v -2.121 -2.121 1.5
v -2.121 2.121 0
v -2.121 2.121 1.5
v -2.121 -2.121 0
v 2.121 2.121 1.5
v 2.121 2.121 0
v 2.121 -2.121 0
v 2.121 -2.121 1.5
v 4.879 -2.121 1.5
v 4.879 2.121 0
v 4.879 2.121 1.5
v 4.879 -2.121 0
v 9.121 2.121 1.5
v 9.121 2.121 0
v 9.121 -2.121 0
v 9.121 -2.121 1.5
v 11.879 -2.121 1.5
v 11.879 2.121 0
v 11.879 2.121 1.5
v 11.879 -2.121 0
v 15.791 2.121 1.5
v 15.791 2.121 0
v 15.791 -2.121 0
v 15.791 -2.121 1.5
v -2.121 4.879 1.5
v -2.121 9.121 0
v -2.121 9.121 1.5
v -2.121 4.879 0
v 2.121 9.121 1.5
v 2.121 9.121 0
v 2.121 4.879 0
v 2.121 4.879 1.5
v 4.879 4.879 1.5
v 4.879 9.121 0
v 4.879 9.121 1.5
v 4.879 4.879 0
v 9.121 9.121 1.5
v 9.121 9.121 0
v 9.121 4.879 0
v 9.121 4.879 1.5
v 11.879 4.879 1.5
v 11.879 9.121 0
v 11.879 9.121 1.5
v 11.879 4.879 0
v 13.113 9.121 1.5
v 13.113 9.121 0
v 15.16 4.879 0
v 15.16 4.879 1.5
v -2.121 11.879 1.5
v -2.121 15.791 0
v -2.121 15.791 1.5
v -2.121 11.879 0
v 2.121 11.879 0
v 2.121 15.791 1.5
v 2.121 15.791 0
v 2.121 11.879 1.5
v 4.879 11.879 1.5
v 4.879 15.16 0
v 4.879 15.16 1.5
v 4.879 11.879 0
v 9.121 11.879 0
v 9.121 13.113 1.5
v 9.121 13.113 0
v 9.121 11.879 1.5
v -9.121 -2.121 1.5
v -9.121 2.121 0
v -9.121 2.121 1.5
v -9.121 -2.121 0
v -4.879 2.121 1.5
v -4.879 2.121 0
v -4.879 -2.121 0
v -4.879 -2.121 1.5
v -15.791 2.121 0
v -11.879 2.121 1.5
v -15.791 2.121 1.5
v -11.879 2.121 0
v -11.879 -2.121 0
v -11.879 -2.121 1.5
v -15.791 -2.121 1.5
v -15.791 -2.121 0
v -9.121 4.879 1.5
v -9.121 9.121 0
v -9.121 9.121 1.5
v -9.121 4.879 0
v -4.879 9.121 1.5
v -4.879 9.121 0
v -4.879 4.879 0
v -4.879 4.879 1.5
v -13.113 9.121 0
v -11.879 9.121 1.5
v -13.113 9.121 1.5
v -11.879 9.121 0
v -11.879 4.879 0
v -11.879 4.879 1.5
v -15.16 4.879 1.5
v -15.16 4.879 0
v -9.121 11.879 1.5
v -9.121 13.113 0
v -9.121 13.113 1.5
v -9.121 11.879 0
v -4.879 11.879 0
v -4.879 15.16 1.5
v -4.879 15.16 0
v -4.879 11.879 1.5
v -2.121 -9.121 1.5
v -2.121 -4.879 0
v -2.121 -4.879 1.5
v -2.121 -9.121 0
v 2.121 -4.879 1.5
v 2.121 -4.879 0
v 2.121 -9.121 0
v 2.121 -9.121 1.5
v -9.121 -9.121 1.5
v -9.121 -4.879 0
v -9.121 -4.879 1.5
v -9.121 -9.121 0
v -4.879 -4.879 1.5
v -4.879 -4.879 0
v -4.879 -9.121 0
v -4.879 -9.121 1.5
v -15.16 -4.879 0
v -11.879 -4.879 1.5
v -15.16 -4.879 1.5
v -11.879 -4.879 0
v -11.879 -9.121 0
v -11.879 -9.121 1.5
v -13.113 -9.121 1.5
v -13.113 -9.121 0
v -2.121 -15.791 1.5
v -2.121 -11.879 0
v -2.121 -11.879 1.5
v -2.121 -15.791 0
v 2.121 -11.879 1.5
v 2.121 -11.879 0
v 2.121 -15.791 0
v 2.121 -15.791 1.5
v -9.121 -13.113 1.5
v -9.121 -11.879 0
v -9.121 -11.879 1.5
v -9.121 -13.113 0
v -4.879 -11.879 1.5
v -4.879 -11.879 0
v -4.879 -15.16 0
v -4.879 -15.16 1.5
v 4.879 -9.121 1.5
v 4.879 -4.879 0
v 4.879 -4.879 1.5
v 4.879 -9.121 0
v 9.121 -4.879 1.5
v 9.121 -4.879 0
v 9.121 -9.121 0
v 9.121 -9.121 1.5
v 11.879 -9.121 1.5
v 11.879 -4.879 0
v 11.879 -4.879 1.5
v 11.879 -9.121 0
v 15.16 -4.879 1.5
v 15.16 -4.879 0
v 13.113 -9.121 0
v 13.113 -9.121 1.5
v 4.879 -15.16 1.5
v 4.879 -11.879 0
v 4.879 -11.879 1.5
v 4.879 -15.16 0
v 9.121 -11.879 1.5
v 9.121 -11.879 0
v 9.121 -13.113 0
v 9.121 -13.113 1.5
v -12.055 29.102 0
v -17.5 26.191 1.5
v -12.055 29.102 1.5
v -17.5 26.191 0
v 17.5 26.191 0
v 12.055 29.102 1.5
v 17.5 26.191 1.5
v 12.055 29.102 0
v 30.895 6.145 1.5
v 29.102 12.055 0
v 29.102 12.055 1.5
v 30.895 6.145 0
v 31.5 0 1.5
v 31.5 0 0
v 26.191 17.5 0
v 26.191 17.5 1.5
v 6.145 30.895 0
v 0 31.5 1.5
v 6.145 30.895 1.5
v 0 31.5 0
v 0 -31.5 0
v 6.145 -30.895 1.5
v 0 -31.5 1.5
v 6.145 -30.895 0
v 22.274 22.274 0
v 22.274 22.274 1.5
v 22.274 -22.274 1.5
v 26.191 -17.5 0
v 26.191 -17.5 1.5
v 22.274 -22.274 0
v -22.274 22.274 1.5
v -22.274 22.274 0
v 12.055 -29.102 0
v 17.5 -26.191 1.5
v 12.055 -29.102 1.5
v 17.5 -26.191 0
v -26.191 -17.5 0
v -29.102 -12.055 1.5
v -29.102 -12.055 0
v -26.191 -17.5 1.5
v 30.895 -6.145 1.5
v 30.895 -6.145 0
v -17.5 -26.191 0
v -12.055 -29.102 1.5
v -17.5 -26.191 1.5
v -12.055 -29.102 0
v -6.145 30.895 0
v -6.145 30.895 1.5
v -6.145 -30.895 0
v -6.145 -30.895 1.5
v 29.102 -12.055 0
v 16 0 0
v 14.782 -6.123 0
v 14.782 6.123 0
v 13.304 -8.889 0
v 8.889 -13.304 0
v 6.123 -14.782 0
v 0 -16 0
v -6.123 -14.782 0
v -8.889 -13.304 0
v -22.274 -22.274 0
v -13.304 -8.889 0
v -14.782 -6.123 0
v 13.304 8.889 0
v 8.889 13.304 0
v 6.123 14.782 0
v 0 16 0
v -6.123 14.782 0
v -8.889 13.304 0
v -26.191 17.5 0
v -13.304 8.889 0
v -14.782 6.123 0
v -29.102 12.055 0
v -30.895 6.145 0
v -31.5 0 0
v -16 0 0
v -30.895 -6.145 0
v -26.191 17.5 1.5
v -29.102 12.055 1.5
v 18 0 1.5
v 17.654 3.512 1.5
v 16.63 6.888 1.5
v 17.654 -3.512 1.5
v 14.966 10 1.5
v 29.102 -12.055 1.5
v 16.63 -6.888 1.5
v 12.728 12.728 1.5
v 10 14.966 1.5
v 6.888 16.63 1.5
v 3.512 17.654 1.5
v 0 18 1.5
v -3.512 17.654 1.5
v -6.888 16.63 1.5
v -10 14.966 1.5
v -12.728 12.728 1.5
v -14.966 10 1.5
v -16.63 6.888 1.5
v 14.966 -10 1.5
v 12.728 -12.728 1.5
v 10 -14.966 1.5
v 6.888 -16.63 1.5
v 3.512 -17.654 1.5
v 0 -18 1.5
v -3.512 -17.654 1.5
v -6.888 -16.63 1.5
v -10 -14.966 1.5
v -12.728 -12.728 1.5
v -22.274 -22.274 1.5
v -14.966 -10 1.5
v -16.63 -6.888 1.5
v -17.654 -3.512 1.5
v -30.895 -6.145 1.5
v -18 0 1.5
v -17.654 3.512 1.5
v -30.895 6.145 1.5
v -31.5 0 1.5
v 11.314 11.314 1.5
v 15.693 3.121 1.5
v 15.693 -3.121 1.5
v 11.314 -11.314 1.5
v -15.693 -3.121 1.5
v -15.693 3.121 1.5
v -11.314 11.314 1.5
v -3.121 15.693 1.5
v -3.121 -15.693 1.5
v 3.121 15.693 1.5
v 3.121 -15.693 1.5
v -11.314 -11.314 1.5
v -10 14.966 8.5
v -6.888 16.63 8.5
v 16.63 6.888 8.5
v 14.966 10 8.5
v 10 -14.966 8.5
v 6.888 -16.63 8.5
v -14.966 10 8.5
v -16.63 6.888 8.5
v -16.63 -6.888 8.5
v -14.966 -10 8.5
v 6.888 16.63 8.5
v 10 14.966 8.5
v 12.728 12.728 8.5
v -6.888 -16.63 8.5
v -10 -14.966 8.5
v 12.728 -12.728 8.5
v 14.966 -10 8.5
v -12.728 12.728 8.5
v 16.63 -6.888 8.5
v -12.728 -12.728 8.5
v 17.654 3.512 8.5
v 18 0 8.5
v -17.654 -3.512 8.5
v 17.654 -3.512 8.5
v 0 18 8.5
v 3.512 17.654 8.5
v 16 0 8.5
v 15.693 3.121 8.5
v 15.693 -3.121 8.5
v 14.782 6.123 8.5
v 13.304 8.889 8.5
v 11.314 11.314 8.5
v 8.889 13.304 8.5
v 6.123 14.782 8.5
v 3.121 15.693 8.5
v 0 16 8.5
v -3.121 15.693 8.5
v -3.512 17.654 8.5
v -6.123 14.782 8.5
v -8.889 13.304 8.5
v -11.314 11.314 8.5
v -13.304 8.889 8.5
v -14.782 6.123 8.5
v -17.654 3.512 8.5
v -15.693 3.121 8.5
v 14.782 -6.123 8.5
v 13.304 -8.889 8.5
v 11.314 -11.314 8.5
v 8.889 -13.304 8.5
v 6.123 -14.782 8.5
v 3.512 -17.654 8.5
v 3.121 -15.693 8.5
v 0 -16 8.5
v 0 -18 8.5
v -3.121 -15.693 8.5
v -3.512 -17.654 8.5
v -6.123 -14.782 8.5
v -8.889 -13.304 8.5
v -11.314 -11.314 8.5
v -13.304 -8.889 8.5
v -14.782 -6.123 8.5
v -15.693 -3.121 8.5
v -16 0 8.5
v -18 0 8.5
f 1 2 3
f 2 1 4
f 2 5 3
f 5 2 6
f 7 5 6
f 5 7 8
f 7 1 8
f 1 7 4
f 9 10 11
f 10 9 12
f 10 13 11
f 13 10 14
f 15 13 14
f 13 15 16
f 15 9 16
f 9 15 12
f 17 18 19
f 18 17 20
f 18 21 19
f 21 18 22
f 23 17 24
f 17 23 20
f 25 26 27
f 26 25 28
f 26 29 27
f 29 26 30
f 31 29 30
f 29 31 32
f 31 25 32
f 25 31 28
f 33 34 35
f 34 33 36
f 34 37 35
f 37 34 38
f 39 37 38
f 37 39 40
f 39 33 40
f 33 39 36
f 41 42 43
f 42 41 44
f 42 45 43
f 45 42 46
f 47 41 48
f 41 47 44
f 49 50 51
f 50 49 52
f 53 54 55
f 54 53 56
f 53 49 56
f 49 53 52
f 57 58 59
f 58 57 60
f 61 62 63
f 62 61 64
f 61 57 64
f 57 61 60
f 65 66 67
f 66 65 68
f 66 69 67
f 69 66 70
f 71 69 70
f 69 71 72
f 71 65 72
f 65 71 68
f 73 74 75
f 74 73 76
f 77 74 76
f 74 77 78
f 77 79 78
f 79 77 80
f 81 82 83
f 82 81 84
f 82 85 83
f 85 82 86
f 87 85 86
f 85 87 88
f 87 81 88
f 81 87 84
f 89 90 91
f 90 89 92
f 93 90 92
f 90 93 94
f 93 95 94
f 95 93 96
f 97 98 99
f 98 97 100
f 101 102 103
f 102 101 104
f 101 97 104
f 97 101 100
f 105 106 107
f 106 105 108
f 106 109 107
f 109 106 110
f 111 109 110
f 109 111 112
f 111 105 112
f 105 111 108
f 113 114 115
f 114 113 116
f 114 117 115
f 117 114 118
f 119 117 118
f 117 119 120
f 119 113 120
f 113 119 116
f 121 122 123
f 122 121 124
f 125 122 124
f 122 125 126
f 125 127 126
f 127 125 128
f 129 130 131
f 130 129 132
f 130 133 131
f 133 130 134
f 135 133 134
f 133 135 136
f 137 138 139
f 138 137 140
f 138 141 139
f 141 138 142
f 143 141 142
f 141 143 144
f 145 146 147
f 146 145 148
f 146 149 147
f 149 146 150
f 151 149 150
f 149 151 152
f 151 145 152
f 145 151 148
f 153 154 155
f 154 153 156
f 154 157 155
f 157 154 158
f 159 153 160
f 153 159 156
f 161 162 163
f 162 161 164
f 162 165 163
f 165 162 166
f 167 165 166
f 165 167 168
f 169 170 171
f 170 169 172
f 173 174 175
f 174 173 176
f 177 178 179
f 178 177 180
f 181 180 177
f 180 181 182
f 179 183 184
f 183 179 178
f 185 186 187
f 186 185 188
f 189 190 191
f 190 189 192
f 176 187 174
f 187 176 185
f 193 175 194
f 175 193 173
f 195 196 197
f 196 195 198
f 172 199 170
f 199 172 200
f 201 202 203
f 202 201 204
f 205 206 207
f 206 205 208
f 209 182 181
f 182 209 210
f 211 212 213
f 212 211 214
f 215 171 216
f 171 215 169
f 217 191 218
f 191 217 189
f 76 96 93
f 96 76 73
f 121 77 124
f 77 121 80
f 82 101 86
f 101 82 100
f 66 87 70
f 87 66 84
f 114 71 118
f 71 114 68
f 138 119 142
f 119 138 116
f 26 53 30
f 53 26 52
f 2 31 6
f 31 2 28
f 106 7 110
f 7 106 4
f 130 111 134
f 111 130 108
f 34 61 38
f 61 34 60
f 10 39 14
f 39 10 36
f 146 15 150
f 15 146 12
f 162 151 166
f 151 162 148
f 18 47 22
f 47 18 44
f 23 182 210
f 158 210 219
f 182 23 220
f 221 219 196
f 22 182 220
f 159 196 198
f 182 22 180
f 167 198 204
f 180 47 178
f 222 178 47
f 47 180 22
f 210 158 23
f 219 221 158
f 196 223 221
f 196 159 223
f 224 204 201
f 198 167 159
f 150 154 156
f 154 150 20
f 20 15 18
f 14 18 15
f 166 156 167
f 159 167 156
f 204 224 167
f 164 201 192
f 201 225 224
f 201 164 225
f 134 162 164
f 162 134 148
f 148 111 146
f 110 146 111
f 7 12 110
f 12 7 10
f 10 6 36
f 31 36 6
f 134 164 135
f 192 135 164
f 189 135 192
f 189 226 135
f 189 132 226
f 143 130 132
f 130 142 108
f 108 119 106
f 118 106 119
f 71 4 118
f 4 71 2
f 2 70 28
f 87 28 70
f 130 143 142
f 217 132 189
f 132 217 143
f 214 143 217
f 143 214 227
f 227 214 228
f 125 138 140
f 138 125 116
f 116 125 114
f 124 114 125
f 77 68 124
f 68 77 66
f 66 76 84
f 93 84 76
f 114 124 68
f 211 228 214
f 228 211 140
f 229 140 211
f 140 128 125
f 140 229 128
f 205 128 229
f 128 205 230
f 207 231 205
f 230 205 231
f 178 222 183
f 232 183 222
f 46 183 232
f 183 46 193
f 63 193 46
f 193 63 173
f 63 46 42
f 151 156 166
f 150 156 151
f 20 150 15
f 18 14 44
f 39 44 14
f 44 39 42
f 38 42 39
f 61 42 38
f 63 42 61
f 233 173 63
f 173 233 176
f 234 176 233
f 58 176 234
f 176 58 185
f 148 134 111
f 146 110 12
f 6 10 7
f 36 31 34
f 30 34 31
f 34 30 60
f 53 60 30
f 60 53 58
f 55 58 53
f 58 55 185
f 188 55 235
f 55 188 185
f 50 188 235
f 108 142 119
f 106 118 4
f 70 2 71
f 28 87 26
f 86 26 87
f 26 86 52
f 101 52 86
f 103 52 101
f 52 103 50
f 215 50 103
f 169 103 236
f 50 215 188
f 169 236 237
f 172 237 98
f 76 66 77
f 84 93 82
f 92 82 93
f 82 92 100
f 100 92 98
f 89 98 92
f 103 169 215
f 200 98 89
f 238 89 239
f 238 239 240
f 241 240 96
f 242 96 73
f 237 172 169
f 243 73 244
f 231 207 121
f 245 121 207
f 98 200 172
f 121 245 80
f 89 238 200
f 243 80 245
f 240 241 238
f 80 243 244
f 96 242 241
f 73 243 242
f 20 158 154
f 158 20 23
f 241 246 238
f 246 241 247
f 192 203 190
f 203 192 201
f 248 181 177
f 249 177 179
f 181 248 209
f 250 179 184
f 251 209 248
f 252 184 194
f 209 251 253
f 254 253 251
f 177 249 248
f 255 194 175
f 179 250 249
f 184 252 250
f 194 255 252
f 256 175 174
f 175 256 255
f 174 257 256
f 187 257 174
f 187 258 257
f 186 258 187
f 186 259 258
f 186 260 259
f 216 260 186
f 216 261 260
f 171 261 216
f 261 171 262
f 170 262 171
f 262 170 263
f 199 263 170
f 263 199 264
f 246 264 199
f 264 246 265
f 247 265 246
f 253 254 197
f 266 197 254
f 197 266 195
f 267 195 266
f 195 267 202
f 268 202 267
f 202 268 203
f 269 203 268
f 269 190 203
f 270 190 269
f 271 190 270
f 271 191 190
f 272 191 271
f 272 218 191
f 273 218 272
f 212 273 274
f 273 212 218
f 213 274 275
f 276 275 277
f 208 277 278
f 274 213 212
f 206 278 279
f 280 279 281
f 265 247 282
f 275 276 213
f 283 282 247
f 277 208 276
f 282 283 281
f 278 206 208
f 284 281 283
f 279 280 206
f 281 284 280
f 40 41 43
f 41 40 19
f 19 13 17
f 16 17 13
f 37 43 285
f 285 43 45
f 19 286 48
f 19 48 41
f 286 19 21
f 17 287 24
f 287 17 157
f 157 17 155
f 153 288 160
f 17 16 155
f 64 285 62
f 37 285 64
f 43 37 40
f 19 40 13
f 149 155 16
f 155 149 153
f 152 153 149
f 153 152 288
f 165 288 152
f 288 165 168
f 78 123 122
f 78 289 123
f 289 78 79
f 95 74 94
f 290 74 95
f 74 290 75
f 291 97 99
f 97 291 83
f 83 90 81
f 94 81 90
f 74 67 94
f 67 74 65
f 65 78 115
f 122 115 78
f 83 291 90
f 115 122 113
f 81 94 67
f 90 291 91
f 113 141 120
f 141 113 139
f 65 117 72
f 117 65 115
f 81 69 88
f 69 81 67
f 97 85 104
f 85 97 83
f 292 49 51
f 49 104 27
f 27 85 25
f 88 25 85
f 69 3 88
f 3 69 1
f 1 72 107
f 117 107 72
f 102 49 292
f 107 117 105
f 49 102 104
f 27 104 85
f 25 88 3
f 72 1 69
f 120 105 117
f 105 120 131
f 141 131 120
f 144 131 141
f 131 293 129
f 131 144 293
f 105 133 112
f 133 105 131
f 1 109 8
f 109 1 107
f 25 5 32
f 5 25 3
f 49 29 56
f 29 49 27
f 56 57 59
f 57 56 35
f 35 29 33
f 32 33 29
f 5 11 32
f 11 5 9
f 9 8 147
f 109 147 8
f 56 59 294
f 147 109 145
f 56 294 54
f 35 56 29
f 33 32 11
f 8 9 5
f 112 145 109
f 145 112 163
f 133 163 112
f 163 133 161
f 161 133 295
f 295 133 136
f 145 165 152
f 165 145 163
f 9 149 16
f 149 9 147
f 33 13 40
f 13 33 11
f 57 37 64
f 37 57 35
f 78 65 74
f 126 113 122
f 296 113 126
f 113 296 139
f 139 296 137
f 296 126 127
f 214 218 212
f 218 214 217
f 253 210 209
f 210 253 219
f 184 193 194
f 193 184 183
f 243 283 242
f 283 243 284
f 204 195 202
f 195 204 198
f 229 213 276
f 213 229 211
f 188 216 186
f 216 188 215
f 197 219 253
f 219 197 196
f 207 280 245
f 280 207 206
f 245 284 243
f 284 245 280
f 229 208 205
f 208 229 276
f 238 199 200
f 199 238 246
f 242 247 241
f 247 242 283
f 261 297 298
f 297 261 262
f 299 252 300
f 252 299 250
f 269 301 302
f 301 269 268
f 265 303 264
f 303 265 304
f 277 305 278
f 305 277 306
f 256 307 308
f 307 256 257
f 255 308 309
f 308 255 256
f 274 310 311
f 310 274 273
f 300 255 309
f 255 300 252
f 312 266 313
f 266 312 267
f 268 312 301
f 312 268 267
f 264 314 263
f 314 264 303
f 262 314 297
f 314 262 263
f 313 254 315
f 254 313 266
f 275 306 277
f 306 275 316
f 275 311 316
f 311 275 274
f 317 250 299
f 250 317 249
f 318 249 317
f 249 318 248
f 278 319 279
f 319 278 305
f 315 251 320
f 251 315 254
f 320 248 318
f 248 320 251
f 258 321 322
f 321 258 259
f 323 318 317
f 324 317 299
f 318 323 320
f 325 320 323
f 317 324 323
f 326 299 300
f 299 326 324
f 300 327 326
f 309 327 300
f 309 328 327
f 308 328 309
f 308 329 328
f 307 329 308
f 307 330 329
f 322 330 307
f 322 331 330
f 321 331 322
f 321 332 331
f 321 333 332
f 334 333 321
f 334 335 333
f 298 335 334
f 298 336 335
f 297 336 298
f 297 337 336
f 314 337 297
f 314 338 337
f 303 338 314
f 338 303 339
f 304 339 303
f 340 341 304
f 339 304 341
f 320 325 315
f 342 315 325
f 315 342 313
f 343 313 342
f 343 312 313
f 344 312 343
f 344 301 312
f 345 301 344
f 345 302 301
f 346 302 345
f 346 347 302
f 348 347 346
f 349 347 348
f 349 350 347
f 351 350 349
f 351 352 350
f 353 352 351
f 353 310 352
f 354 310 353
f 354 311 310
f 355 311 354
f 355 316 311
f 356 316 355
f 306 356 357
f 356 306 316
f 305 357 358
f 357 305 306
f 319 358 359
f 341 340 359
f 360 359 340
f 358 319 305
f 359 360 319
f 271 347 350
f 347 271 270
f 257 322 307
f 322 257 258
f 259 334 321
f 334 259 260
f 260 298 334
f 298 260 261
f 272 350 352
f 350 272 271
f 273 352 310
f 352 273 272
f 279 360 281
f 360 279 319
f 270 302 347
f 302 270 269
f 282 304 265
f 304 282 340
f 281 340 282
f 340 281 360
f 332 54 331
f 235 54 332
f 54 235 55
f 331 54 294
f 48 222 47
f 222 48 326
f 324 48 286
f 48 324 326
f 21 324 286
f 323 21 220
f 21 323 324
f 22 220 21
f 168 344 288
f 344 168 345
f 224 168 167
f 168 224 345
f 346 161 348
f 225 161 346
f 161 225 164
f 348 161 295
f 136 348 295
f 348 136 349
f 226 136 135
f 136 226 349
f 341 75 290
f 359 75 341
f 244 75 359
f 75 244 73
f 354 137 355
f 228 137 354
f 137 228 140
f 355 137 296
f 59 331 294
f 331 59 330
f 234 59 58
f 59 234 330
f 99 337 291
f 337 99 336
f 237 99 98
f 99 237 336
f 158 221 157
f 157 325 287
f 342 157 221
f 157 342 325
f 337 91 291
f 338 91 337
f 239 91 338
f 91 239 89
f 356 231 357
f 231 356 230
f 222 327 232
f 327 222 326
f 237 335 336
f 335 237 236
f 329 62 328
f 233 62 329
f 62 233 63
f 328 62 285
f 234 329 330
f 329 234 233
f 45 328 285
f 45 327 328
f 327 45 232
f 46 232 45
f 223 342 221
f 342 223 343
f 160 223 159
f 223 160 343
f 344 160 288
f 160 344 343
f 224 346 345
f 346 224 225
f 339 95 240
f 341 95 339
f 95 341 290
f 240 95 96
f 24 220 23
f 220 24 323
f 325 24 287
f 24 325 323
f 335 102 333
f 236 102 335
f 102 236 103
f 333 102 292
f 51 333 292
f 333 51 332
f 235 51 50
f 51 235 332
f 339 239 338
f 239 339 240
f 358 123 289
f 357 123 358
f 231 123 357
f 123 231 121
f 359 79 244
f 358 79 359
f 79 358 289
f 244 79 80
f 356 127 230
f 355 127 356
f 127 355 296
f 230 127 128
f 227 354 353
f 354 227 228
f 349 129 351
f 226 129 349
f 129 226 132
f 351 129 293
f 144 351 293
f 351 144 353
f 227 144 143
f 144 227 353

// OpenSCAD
//outline = "main.dxf";


//	  linear_extrude(height=1.3, convexity=5) {
//	       import(file=outline, layer="0", $fn=180);
//	     }
//
//	  linear_extrude(height=5, convexity=5) {
//	       import(file=outline, layer="1", $fn=180);
//	     }
//
//

//	translate([0,10,8])
//     rotate([0,90,0])
//     cylinder(h = 50, r = 4.1, center = true, $fn=32);

top_radius = 63 / 2.0;
top_height = 1.5
;
         
bottom_radius = 36 / 2.0;
bottom_height = 7;
bottom_wall = 2;

hole_spacing = 4;         

hole_side = 3;
         

top();

bottom();

module bottom()
{
        
        translate([0,0,top_height])
        bottom_hole(bottom_height);
    
        
        translate([0,0,0])
        color([1,1,1]) bottom_hole(top_height);
        
}
module bottom_hole(height) {
    
    
    difference() {
        
        bottom_part(height);
        
        cylinder(h=height+2, r= bottom_radius-bottom_wall, center = false, $fn=32);
    }
    
}
module top() {        
    translate([0,0,0]);
    
    difference() {
            top_part();
            full_grid();           
    }
    bottom_top();
    
}
module bottom_top()
{
    difference() {
        top_part();
        bottom_part(bottom_height);
    }
}
module top_part()
{  
     color([0,0,1]) cylinder(h=top_height, r= top_radius, center = false, $fn=32);
}
module bottom_part(height)
{
     color([1,0,0])  cylinder(h=height, r= bottom_radius, center = false, $fn=32);
}
// translate([0,0,-10]) square(hole_spacing,false);

spacing = hole_spacing+hole_side;

module full_grid()
{

grid_quadrant(0,spacing, bottom_radius,0, spacing, bottom_radius);
grid_quadrant(0,-spacing, -bottom_radius, 0, spacing, bottom_radius);
grid_quadrant(0,-spacing, -bottom_radius, 0, -spacing, -bottom_radius);
grid_quadrant(0,spacing, bottom_radius, 0, -spacing, -bottom_radius);

}

module grid_quadrant(x_start, x_spacing, x_end, y_start, y_spacing, y_end)
{
    pos = 0;
    for (pos_y = [y_start:y_spacing:y_end]) {
    for (pos_x = [x_start:x_spacing:x_end]) {
            
            translate([pos_x , pos_y , -(top_height/2.0)-0.1]) color([0,1,0]) {
                rotate([0,0,45])
                cylinder ( h=bottom_height+0.1, r=hole_side, center=false, $fn=4);
            }
            
    //            color([0,1,1]) translate([pos-hole_spacing,0,0]) square(hole_spacing,true);

    }
    }
}
 
    
